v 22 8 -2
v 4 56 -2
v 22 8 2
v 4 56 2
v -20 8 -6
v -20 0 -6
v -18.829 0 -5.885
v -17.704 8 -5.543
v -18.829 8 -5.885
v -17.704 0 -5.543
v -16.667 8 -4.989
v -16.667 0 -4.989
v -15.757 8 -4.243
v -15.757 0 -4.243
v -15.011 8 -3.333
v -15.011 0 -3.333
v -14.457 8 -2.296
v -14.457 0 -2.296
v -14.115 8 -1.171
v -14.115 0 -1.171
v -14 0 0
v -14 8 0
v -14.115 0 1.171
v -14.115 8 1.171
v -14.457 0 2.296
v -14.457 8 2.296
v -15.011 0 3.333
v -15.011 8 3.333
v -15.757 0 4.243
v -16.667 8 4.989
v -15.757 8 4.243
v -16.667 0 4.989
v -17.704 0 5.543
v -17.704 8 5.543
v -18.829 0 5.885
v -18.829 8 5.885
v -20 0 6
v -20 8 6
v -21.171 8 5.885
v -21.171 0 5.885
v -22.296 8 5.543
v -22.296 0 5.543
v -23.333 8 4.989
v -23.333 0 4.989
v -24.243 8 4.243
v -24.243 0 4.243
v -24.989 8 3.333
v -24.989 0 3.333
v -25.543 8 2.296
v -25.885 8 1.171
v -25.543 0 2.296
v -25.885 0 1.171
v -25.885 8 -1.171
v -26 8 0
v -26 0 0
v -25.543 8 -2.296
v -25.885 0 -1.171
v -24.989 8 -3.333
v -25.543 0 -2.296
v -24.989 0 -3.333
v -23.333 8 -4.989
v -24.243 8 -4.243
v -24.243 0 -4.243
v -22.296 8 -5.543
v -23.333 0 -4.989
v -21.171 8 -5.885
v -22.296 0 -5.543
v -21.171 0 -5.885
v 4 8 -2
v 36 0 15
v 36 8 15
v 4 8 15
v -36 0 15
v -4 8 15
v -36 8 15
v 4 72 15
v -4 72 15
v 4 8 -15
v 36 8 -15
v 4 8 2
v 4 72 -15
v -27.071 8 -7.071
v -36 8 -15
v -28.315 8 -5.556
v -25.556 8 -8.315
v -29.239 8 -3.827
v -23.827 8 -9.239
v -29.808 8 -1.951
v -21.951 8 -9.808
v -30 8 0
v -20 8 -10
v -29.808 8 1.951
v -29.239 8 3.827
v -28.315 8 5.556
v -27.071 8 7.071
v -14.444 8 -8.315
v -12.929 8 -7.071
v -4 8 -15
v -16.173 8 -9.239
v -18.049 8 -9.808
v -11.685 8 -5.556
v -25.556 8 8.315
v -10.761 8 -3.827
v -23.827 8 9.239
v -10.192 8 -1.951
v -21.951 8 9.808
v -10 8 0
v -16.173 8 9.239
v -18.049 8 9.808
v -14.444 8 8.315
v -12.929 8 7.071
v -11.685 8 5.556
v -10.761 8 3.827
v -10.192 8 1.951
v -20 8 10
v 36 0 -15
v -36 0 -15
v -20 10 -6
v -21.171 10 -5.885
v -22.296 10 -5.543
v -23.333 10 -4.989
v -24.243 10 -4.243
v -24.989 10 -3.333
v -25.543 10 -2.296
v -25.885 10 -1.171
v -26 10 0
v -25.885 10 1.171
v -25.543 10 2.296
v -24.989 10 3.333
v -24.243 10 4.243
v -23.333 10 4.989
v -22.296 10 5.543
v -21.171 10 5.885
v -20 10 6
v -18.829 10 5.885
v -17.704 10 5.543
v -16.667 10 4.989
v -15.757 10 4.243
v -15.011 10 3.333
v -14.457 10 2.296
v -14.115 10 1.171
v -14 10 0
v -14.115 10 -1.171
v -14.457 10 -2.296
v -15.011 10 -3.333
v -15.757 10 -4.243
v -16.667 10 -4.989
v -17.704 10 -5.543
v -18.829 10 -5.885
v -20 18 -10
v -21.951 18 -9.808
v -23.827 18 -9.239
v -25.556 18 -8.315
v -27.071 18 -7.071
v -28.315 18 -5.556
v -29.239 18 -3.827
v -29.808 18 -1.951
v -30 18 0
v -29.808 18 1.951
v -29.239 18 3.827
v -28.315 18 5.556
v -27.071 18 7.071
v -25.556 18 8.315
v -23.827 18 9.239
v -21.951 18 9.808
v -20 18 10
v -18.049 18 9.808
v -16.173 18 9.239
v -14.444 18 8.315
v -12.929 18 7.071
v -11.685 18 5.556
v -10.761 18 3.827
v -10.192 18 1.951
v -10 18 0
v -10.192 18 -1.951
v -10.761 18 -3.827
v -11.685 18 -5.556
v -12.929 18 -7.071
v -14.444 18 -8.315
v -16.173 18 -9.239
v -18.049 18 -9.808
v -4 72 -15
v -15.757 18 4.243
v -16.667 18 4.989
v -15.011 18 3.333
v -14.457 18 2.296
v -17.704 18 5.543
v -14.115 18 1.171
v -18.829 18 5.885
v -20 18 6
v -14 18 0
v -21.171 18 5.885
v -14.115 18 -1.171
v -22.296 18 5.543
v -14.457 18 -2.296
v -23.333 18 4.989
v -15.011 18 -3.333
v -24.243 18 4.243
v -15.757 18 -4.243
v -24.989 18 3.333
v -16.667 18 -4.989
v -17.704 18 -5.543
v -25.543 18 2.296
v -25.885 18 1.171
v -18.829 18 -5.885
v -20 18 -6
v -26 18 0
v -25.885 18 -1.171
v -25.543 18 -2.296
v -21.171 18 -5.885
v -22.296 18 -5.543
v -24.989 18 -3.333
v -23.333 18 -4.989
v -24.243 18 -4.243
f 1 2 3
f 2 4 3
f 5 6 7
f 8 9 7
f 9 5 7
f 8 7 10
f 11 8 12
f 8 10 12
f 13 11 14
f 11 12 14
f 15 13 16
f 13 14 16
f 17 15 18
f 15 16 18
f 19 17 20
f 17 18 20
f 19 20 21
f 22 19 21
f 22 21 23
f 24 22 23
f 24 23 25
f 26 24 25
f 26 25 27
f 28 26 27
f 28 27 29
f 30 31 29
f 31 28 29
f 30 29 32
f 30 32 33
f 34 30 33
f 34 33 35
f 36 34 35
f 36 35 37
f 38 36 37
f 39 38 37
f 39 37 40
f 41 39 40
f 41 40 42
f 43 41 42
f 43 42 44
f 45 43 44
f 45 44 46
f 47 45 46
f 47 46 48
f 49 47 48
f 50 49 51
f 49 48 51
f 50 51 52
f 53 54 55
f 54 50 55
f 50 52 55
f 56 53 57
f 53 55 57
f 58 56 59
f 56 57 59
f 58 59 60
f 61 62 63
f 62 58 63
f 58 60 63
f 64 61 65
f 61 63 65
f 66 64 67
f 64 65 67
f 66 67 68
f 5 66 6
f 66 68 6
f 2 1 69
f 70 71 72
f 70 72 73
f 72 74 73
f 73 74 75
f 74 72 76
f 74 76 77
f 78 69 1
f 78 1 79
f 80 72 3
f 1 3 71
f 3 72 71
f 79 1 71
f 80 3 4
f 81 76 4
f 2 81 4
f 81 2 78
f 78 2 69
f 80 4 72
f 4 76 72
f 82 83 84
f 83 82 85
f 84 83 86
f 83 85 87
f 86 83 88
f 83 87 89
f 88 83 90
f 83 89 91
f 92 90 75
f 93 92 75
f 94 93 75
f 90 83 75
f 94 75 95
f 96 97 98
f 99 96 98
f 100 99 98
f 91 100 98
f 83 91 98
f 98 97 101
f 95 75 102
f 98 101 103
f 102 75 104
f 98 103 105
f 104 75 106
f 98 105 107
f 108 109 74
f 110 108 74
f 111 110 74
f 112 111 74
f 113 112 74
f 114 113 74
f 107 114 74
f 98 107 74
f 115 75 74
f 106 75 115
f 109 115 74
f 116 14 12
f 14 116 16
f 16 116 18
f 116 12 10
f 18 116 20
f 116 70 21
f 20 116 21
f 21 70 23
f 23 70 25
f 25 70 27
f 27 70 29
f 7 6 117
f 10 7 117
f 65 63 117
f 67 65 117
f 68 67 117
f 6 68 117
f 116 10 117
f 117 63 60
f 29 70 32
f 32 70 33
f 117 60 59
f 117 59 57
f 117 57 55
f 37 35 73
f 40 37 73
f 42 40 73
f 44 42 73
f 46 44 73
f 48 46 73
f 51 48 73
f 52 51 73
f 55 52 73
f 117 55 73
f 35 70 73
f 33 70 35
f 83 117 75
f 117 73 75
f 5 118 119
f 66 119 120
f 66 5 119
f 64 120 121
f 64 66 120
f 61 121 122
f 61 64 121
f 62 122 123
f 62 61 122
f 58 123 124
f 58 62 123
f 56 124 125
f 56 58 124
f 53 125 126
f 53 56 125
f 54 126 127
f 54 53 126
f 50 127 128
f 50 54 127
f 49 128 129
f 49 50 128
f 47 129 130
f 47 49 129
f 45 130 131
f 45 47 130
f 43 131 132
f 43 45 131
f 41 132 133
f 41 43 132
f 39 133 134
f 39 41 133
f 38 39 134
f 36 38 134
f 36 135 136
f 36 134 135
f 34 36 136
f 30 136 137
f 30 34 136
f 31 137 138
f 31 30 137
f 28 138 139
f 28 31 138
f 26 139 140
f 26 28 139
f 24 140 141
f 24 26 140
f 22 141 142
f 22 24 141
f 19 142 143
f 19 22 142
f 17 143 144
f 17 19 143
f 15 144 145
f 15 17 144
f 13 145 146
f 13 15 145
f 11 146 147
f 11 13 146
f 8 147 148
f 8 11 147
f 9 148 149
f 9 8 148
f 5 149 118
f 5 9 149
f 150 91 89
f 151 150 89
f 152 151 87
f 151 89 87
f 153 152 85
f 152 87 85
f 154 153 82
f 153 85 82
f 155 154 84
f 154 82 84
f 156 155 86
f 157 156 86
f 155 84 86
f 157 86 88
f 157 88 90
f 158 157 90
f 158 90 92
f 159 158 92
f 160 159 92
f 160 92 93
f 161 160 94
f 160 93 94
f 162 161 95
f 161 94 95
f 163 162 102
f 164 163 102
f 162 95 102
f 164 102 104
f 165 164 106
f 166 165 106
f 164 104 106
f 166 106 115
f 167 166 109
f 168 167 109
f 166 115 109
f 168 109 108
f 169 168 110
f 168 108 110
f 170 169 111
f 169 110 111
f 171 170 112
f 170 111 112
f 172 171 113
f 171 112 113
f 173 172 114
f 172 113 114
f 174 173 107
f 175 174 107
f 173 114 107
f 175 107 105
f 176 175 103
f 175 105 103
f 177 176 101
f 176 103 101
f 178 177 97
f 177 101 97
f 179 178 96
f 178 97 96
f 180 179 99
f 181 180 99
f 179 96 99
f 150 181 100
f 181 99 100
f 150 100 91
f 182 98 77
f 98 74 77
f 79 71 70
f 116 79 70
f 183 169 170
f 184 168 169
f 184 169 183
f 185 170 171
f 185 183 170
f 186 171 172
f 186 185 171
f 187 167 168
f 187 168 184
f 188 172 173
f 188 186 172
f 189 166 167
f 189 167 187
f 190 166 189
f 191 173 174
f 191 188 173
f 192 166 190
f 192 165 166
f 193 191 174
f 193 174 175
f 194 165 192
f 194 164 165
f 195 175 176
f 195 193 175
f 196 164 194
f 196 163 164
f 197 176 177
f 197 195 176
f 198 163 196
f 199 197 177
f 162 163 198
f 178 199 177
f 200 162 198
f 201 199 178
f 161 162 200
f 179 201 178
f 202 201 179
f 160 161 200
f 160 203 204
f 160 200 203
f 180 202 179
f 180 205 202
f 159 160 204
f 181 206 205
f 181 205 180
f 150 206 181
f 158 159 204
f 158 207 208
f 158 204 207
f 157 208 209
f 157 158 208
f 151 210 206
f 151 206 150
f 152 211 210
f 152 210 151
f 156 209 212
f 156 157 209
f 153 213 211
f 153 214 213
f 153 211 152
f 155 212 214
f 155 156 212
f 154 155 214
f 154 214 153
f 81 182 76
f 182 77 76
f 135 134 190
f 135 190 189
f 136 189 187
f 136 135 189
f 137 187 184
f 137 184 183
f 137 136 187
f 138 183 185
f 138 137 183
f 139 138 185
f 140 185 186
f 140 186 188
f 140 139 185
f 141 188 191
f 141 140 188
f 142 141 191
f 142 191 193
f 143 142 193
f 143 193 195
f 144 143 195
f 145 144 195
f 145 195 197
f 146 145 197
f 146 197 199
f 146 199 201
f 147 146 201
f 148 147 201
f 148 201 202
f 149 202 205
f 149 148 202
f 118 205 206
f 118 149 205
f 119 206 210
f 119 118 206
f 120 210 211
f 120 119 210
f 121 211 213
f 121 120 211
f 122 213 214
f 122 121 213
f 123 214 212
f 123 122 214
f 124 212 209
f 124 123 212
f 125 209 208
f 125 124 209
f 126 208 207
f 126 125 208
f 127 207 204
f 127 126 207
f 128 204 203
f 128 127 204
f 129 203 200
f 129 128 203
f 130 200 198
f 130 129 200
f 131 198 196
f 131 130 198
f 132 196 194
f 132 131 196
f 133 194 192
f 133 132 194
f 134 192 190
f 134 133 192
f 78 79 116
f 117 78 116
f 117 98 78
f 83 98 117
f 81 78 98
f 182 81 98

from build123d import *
from build123d.topology import SkipClean

# Parameters (mm, degrees)
BOSS_EXTRUDE1_DEPTH = 15
BOSS_EXTRUDE2_DEPTH = 2
SKETCH3_R           = 10
SKETCH3_R_2         = 6
BOSS_EXTRUDE3_DEPTH = 10
SKETCH4_R           = 6
CUT_EXTRUDE1_DEPTH  = 10


with BuildPart() as part:
    # Sketch1 → Boss-Extrude1 (new, symmetric)
    with BuildSketch(Plane.XY):
        Polygon((36, 0), (-36, 0), (-36, 8), (-4, 8), (-4, 72), (4, 72), (4, 8), (36, 8), align=None)
    extrude(amount=BOSS_EXTRUDE1_DEPTH, both=True)

    # Sketch2 → Boss-Extrude2 (add, symmetric)
    with BuildSketch(Plane.XY):
        Polygon((4, 8), (4, 56), (22, 8), align=None)
    extrude(amount=BOSS_EXTRUDE2_DEPTH, both=True)

    # Sketch3 → Boss-Extrude3 (add)
    with BuildSketch(Plane(origin=(0, 8, 0), x_dir=(1, 0, 0), z_dir=(0, 1, 0))):
        with Locations(Location((-20, 0, 0), (0, 0, 90))):
            Circle(SKETCH3_R)
        with Locations(Location((-20, 0, 0), (0, 0, 270))):
            Circle(SKETCH3_R_2, mode=Mode.SUBTRACT)
    extrude(amount=BOSS_EXTRUDE3_DEPTH)

    # Sketch4 → Cut-Extrude1 (cut)
    with SkipClean():  # the faces are left unmerged after this step: merging them gives an invalid solid
        with BuildSketch(Plane.XZ):
            with Locations(Location((-20, 0, 0), (0, 0, 270))):
                Circle(SKETCH4_R)
        extrude(amount=-CUT_EXTRUDE1_DEPTH, mode=Mode.SUBTRACT)


solid = part.part
